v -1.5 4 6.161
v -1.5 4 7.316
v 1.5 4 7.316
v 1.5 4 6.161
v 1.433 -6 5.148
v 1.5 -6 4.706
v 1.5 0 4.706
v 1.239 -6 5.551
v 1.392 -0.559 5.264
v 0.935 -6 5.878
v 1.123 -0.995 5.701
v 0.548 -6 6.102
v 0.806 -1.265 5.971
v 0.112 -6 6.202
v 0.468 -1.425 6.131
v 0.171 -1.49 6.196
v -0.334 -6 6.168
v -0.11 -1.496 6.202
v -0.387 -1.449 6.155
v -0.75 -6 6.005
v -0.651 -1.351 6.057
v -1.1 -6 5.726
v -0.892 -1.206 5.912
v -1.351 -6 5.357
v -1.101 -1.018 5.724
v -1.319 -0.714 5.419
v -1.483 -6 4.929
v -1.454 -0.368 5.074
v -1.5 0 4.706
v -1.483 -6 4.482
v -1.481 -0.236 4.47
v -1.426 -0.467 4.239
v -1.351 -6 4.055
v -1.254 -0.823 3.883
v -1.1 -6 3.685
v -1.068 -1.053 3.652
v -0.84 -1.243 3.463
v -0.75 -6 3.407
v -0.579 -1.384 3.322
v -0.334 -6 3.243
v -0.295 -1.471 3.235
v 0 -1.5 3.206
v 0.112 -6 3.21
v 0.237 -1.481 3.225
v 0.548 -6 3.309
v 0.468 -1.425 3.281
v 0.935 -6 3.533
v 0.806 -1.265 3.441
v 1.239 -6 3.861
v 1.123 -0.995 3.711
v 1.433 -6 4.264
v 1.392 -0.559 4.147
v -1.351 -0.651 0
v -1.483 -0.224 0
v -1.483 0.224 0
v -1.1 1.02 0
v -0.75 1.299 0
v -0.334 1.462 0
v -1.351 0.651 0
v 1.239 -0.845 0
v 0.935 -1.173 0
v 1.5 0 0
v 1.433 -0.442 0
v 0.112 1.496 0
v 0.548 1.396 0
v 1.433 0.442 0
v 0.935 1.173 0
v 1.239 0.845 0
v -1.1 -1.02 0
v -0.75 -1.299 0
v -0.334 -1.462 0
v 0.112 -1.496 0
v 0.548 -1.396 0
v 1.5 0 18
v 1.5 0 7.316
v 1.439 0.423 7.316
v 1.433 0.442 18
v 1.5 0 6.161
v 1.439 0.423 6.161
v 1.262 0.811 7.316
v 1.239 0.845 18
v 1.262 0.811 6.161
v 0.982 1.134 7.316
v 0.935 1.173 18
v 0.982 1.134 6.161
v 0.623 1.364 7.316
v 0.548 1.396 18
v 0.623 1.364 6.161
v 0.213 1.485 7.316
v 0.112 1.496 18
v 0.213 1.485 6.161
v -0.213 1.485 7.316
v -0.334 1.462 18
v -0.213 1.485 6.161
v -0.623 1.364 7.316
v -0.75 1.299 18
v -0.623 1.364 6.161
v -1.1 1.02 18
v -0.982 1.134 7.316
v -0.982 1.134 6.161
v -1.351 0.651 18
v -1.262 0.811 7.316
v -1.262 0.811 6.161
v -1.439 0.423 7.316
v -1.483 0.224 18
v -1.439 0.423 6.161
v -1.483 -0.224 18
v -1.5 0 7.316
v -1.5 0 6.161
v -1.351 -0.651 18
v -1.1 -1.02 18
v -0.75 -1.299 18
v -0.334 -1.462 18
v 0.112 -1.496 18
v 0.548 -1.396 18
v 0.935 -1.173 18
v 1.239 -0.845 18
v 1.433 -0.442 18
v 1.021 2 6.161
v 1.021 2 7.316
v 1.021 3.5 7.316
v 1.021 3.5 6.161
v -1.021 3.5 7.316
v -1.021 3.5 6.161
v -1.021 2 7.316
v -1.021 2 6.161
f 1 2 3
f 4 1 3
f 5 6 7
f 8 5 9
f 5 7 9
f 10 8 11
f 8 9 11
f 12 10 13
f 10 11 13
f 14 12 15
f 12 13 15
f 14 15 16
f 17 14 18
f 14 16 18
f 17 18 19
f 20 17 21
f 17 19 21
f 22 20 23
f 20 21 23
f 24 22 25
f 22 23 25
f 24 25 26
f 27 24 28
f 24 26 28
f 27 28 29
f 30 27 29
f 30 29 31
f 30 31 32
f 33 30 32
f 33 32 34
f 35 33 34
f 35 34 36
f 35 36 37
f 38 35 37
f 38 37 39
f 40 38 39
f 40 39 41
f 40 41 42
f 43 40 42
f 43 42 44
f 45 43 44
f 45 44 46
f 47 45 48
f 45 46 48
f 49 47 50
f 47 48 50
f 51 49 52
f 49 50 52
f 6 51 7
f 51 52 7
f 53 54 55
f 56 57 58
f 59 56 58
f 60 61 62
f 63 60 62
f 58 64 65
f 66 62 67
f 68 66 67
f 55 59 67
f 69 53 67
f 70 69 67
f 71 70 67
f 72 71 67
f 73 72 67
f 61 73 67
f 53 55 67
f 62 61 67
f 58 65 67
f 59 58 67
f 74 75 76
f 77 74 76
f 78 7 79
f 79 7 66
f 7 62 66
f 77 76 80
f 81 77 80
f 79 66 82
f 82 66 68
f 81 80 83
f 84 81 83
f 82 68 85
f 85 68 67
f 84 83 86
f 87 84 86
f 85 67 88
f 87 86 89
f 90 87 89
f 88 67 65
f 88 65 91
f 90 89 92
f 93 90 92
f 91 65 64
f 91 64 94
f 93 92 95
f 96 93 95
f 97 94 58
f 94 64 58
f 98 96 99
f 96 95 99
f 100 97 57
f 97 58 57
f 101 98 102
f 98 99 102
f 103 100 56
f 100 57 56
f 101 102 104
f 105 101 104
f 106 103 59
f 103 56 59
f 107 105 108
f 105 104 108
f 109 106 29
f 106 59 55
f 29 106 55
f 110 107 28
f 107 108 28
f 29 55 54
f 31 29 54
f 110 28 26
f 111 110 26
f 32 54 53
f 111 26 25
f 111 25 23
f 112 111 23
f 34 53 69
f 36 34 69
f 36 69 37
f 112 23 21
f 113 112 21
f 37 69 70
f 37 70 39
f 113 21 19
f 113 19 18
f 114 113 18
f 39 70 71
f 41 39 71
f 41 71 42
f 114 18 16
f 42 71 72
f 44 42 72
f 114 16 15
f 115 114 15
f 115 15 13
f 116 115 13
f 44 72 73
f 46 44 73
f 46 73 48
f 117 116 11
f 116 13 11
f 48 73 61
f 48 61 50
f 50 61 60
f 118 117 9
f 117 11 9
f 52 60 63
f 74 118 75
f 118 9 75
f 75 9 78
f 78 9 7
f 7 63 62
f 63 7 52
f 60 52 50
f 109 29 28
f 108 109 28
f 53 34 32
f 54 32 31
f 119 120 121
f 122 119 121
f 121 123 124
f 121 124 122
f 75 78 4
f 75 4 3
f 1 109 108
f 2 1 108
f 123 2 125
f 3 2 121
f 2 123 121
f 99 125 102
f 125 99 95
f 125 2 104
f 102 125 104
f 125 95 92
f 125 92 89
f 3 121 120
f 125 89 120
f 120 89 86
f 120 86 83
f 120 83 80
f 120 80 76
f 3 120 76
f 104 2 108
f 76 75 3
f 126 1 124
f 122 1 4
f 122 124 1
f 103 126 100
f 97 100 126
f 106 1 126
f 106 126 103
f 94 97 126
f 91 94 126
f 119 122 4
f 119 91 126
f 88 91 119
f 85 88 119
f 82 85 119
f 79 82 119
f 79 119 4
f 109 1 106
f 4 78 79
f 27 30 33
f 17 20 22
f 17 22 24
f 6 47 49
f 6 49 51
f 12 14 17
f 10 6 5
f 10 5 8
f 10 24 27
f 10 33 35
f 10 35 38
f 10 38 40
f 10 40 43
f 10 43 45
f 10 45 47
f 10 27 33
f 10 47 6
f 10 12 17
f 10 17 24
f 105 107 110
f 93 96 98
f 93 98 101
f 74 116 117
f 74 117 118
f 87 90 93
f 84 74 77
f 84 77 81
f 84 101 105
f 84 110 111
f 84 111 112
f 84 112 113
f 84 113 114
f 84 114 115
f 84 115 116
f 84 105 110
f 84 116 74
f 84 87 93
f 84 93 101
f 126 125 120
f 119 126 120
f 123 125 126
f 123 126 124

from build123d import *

# Parameters (mm, degrees)
F0_R     = 1.5
F1_DEPTH = 18
F2_R     = 1.5
F3_DEPTH = 6
F4_W     = 3
F4_H     = 1.154314
F5_DEPTH = 4
F6_W     = 2.042234
F6_H     = 1.5
F7_DEPTH = 25


with BuildPart() as f1:
    # F0 (on Top) → F1 (new body)
    with BuildSketch(Plane.XY):
        Circle(F0_R)
    extrude(amount=F1_DEPTH)

    # F2 (on Front) → F3 (join)
    with BuildSketch(Plane.XZ):
        with Locations((0, 4.705742)):
            Circle(F2_R)
    extrude(amount=F3_DEPTH)

    # F4 (on Front) → F5 (join)
    with BuildSketch(Plane.XZ):
        with Locations((0, 6.738564)):
            Rectangle(F4_W, F4_H)
    extrude(amount=-F5_DEPTH)

    # F6 (on face) → F7 (cut)
    with BuildSketch(Plane.XY.offset(7.315721)):
        with Locations((0, 2.75)):
            Rectangle(F6_W, F6_H)
    extrude(amount=-F7_DEPTH, mode=Mode.SUBTRACT)


solid = f1.part
